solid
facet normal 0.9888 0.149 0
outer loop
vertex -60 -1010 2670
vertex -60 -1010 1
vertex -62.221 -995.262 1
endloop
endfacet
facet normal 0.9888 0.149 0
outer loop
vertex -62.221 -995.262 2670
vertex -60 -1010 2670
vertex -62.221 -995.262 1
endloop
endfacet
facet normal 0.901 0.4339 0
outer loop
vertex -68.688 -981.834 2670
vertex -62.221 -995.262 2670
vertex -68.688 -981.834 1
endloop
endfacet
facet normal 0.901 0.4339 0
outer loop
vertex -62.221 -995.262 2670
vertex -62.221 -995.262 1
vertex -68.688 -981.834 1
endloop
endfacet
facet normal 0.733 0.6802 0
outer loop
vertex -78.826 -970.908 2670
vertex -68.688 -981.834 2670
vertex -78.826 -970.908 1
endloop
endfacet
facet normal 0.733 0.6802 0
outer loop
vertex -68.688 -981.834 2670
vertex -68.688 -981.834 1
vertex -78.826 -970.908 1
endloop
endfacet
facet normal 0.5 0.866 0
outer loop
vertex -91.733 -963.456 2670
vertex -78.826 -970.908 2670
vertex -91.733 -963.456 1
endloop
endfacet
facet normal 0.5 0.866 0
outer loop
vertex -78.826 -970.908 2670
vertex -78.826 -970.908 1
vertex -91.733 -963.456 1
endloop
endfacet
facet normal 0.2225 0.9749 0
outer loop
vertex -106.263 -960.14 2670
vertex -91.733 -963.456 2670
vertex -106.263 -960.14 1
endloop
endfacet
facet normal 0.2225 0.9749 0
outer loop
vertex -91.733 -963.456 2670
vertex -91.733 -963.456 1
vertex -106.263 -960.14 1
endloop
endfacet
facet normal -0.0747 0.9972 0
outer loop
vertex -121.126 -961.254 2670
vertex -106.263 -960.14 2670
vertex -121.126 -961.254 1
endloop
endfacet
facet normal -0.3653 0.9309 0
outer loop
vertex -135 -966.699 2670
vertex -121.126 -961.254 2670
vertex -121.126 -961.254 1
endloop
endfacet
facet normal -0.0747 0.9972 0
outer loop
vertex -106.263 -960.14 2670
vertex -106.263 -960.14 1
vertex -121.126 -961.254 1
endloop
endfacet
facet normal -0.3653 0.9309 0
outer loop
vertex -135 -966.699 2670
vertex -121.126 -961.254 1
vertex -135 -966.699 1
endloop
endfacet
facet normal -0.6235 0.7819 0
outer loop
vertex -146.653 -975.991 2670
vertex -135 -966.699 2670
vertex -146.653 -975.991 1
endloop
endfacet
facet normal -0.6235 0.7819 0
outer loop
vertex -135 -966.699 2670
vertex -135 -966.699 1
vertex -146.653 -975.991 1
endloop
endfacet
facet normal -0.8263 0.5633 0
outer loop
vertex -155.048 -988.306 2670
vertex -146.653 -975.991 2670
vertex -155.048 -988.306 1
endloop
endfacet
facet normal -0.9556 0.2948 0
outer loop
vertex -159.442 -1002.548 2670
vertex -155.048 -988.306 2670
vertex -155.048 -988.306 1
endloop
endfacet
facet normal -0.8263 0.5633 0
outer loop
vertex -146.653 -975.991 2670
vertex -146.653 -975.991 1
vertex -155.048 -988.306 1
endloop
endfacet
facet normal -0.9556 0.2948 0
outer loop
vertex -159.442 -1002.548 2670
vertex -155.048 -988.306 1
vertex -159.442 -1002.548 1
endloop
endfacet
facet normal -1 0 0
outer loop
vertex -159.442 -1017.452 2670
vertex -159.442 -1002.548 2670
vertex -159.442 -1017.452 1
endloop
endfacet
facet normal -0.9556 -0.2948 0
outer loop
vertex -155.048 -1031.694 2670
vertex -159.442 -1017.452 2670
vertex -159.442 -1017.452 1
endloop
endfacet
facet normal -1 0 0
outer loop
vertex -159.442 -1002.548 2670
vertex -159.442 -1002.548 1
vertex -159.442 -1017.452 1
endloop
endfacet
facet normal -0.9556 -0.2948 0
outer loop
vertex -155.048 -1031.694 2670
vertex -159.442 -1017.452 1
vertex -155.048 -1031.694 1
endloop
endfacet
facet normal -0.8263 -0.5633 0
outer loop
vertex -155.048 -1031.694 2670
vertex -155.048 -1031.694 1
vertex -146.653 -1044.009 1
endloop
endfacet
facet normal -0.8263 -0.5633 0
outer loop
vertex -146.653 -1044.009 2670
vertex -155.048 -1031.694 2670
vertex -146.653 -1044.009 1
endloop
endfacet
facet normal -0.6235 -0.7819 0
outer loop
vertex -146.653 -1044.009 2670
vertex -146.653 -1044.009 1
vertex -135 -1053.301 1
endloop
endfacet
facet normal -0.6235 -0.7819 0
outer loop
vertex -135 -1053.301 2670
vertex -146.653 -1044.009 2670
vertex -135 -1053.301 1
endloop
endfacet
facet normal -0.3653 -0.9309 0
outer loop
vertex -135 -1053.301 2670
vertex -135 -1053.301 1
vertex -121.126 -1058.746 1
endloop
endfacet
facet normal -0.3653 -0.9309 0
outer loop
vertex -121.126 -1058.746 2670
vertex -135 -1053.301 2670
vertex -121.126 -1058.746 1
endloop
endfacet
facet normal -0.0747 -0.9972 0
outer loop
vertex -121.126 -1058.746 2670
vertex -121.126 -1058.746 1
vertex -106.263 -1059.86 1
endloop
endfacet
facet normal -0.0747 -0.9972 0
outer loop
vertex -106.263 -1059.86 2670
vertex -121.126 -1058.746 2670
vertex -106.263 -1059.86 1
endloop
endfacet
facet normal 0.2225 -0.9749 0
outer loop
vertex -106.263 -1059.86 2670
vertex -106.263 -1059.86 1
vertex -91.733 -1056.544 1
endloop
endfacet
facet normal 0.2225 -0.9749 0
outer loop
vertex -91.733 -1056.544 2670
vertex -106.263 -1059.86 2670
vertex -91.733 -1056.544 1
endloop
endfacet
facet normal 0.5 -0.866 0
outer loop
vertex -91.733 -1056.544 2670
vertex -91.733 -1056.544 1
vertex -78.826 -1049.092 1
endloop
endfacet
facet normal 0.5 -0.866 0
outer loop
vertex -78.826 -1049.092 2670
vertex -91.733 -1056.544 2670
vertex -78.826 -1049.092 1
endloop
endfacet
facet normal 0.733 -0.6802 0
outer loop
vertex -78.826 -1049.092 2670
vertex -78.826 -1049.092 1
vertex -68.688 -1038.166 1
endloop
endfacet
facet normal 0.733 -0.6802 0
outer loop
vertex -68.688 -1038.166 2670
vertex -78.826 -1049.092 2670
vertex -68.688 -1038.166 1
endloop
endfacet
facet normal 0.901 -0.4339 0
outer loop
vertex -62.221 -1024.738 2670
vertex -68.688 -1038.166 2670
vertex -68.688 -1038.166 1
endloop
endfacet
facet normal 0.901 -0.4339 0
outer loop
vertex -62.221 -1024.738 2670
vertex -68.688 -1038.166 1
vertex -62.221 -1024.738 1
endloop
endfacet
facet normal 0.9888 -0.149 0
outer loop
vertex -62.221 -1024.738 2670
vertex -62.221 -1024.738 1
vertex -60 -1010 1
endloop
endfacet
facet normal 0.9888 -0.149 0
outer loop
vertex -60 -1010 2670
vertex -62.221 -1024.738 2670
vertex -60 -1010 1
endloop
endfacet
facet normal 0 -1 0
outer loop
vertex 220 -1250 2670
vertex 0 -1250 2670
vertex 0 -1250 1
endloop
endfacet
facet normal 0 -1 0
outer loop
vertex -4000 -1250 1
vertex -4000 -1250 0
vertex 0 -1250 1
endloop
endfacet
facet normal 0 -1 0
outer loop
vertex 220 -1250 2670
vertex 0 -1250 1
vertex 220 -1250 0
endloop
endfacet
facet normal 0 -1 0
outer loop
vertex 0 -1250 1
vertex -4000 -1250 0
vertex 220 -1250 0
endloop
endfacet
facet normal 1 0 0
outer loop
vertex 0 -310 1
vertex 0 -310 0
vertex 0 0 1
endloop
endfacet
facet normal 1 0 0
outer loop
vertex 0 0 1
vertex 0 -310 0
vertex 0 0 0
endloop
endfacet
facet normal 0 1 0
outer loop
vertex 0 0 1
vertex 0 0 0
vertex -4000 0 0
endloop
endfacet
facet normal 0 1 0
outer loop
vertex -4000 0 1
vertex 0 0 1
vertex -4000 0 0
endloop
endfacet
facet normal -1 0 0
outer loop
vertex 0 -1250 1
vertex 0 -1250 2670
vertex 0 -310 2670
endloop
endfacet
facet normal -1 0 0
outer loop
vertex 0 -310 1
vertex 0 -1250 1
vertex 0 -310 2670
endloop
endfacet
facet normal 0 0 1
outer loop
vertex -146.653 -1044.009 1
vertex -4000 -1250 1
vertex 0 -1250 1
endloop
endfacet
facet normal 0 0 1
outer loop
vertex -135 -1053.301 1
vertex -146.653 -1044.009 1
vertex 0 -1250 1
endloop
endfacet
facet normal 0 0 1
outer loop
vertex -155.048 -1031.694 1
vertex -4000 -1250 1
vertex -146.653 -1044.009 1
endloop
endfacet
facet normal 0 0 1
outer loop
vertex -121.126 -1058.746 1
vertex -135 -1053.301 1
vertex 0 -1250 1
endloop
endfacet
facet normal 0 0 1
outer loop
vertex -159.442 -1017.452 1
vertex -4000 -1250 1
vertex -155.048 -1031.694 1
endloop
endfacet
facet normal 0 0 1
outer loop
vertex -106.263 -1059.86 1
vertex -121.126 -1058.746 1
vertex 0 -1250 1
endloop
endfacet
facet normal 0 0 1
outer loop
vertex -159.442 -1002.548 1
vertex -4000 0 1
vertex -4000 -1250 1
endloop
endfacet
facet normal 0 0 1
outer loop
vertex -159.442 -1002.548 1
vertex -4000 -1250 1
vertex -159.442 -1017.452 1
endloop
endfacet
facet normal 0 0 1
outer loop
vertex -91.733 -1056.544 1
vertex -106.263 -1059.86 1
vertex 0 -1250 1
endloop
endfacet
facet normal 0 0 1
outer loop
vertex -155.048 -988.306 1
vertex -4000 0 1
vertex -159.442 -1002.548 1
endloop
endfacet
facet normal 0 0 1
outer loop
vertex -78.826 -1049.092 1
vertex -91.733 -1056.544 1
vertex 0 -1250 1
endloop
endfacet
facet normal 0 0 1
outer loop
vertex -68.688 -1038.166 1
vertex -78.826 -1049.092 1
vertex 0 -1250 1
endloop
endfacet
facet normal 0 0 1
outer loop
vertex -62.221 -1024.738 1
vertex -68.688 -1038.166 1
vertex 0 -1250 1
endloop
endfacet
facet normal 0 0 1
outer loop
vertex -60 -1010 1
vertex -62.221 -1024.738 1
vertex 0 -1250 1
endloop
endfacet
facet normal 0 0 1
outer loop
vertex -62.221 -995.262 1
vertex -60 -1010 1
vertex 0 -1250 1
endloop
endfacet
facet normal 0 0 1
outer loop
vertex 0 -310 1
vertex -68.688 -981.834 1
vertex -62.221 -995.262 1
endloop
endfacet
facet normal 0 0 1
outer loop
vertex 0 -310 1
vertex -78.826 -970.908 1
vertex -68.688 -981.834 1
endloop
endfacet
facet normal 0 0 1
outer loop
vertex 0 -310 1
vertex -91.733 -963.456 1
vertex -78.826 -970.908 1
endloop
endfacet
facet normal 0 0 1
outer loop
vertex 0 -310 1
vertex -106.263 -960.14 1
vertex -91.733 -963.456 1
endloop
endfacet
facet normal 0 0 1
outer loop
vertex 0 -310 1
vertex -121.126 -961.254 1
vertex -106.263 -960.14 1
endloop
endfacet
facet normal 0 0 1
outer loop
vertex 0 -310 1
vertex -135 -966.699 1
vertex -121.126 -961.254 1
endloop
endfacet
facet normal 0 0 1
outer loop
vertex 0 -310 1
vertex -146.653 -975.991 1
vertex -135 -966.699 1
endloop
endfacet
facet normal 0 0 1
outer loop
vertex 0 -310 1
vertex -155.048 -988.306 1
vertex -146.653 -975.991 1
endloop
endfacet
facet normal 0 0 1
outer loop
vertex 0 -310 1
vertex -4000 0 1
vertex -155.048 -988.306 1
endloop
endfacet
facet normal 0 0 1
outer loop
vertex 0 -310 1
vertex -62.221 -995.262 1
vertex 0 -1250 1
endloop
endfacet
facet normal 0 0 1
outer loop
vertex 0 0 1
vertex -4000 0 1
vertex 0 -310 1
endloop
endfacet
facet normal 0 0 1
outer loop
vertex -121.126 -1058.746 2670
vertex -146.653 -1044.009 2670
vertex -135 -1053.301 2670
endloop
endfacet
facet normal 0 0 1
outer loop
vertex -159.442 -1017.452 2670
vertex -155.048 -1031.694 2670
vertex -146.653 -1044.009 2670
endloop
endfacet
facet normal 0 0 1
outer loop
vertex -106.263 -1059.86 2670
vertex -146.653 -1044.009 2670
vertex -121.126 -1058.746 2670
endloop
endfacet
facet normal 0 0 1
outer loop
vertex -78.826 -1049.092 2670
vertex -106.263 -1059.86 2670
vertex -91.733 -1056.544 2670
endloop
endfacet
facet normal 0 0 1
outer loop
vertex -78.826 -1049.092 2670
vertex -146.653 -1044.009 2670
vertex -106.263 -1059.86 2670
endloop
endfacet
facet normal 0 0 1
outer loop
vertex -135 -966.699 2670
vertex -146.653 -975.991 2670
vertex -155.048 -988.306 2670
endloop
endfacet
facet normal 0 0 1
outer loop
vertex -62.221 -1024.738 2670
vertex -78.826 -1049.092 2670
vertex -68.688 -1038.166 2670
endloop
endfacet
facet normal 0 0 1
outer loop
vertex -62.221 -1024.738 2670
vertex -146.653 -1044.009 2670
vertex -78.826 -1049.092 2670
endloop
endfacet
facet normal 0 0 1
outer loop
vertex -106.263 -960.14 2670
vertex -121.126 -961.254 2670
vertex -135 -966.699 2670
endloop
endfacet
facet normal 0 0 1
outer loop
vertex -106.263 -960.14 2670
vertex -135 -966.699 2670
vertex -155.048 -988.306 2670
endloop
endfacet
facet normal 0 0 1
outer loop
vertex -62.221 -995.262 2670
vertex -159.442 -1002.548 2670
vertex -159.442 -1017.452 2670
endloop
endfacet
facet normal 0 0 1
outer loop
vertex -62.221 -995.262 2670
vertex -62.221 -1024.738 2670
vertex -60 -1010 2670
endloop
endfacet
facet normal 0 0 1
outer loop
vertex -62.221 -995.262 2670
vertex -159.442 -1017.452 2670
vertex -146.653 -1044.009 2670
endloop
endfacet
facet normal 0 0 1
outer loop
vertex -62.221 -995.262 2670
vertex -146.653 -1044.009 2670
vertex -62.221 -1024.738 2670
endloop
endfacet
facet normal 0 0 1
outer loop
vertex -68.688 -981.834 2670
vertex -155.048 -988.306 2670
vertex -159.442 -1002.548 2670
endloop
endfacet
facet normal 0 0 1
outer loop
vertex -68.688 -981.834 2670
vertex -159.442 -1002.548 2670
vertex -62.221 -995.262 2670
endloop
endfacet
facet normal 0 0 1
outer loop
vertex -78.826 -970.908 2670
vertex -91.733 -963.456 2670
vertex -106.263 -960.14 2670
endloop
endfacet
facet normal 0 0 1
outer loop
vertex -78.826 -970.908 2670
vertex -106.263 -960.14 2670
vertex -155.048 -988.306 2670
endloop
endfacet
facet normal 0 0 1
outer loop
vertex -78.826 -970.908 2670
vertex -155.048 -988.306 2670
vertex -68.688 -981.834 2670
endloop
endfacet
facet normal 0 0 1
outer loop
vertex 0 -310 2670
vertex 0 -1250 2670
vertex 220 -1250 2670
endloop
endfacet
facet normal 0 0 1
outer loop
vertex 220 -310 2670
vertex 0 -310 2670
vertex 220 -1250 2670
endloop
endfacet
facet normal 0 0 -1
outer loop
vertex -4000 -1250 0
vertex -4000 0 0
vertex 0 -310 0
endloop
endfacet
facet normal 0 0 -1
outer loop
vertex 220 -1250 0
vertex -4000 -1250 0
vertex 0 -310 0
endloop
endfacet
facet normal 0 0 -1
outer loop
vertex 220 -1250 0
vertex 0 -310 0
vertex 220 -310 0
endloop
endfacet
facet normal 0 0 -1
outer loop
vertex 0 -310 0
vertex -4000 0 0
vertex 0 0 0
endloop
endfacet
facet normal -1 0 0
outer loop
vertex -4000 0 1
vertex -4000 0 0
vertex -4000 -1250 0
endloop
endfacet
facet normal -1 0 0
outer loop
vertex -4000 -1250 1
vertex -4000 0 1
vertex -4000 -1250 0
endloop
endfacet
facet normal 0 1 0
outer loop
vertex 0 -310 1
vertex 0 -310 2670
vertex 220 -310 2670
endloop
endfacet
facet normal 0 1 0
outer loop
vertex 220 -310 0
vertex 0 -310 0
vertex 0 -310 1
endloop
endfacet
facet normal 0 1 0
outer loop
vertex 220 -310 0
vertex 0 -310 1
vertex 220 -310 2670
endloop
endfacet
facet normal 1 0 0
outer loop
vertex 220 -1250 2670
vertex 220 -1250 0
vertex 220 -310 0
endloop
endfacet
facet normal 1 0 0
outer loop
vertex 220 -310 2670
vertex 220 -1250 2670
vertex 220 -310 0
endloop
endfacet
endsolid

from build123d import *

# Parameters (mm, degrees)
F0_R     = 50
F1_DEPTH = 1
F0_W     = 220
F0_H     = 940
F2_DEPTH = 2670


with BuildPart() as f1:
    # F0 (on Top) → F1 (new body)
    with BuildSketch(Plane.XY):
        Polygon((0, 0), (-4000, 0), (-4000, -1250), (0, -1250), (0, -310), align=None)
        with Locations((-110, -1010)):
            Circle(F0_R, mode=Mode.SUBTRACT)
    extrude(amount=F1_DEPTH)

    # F0 (on Top) → F2 (join)
    with BuildSketch(Plane.XY):
        with Locations((110, -780)):
            Rectangle(F0_W, F0_H)
        with Locations((-110, -1010)):
            Circle(F0_R)
    extrude(amount=F2_DEPTH)


solid = f1.part
